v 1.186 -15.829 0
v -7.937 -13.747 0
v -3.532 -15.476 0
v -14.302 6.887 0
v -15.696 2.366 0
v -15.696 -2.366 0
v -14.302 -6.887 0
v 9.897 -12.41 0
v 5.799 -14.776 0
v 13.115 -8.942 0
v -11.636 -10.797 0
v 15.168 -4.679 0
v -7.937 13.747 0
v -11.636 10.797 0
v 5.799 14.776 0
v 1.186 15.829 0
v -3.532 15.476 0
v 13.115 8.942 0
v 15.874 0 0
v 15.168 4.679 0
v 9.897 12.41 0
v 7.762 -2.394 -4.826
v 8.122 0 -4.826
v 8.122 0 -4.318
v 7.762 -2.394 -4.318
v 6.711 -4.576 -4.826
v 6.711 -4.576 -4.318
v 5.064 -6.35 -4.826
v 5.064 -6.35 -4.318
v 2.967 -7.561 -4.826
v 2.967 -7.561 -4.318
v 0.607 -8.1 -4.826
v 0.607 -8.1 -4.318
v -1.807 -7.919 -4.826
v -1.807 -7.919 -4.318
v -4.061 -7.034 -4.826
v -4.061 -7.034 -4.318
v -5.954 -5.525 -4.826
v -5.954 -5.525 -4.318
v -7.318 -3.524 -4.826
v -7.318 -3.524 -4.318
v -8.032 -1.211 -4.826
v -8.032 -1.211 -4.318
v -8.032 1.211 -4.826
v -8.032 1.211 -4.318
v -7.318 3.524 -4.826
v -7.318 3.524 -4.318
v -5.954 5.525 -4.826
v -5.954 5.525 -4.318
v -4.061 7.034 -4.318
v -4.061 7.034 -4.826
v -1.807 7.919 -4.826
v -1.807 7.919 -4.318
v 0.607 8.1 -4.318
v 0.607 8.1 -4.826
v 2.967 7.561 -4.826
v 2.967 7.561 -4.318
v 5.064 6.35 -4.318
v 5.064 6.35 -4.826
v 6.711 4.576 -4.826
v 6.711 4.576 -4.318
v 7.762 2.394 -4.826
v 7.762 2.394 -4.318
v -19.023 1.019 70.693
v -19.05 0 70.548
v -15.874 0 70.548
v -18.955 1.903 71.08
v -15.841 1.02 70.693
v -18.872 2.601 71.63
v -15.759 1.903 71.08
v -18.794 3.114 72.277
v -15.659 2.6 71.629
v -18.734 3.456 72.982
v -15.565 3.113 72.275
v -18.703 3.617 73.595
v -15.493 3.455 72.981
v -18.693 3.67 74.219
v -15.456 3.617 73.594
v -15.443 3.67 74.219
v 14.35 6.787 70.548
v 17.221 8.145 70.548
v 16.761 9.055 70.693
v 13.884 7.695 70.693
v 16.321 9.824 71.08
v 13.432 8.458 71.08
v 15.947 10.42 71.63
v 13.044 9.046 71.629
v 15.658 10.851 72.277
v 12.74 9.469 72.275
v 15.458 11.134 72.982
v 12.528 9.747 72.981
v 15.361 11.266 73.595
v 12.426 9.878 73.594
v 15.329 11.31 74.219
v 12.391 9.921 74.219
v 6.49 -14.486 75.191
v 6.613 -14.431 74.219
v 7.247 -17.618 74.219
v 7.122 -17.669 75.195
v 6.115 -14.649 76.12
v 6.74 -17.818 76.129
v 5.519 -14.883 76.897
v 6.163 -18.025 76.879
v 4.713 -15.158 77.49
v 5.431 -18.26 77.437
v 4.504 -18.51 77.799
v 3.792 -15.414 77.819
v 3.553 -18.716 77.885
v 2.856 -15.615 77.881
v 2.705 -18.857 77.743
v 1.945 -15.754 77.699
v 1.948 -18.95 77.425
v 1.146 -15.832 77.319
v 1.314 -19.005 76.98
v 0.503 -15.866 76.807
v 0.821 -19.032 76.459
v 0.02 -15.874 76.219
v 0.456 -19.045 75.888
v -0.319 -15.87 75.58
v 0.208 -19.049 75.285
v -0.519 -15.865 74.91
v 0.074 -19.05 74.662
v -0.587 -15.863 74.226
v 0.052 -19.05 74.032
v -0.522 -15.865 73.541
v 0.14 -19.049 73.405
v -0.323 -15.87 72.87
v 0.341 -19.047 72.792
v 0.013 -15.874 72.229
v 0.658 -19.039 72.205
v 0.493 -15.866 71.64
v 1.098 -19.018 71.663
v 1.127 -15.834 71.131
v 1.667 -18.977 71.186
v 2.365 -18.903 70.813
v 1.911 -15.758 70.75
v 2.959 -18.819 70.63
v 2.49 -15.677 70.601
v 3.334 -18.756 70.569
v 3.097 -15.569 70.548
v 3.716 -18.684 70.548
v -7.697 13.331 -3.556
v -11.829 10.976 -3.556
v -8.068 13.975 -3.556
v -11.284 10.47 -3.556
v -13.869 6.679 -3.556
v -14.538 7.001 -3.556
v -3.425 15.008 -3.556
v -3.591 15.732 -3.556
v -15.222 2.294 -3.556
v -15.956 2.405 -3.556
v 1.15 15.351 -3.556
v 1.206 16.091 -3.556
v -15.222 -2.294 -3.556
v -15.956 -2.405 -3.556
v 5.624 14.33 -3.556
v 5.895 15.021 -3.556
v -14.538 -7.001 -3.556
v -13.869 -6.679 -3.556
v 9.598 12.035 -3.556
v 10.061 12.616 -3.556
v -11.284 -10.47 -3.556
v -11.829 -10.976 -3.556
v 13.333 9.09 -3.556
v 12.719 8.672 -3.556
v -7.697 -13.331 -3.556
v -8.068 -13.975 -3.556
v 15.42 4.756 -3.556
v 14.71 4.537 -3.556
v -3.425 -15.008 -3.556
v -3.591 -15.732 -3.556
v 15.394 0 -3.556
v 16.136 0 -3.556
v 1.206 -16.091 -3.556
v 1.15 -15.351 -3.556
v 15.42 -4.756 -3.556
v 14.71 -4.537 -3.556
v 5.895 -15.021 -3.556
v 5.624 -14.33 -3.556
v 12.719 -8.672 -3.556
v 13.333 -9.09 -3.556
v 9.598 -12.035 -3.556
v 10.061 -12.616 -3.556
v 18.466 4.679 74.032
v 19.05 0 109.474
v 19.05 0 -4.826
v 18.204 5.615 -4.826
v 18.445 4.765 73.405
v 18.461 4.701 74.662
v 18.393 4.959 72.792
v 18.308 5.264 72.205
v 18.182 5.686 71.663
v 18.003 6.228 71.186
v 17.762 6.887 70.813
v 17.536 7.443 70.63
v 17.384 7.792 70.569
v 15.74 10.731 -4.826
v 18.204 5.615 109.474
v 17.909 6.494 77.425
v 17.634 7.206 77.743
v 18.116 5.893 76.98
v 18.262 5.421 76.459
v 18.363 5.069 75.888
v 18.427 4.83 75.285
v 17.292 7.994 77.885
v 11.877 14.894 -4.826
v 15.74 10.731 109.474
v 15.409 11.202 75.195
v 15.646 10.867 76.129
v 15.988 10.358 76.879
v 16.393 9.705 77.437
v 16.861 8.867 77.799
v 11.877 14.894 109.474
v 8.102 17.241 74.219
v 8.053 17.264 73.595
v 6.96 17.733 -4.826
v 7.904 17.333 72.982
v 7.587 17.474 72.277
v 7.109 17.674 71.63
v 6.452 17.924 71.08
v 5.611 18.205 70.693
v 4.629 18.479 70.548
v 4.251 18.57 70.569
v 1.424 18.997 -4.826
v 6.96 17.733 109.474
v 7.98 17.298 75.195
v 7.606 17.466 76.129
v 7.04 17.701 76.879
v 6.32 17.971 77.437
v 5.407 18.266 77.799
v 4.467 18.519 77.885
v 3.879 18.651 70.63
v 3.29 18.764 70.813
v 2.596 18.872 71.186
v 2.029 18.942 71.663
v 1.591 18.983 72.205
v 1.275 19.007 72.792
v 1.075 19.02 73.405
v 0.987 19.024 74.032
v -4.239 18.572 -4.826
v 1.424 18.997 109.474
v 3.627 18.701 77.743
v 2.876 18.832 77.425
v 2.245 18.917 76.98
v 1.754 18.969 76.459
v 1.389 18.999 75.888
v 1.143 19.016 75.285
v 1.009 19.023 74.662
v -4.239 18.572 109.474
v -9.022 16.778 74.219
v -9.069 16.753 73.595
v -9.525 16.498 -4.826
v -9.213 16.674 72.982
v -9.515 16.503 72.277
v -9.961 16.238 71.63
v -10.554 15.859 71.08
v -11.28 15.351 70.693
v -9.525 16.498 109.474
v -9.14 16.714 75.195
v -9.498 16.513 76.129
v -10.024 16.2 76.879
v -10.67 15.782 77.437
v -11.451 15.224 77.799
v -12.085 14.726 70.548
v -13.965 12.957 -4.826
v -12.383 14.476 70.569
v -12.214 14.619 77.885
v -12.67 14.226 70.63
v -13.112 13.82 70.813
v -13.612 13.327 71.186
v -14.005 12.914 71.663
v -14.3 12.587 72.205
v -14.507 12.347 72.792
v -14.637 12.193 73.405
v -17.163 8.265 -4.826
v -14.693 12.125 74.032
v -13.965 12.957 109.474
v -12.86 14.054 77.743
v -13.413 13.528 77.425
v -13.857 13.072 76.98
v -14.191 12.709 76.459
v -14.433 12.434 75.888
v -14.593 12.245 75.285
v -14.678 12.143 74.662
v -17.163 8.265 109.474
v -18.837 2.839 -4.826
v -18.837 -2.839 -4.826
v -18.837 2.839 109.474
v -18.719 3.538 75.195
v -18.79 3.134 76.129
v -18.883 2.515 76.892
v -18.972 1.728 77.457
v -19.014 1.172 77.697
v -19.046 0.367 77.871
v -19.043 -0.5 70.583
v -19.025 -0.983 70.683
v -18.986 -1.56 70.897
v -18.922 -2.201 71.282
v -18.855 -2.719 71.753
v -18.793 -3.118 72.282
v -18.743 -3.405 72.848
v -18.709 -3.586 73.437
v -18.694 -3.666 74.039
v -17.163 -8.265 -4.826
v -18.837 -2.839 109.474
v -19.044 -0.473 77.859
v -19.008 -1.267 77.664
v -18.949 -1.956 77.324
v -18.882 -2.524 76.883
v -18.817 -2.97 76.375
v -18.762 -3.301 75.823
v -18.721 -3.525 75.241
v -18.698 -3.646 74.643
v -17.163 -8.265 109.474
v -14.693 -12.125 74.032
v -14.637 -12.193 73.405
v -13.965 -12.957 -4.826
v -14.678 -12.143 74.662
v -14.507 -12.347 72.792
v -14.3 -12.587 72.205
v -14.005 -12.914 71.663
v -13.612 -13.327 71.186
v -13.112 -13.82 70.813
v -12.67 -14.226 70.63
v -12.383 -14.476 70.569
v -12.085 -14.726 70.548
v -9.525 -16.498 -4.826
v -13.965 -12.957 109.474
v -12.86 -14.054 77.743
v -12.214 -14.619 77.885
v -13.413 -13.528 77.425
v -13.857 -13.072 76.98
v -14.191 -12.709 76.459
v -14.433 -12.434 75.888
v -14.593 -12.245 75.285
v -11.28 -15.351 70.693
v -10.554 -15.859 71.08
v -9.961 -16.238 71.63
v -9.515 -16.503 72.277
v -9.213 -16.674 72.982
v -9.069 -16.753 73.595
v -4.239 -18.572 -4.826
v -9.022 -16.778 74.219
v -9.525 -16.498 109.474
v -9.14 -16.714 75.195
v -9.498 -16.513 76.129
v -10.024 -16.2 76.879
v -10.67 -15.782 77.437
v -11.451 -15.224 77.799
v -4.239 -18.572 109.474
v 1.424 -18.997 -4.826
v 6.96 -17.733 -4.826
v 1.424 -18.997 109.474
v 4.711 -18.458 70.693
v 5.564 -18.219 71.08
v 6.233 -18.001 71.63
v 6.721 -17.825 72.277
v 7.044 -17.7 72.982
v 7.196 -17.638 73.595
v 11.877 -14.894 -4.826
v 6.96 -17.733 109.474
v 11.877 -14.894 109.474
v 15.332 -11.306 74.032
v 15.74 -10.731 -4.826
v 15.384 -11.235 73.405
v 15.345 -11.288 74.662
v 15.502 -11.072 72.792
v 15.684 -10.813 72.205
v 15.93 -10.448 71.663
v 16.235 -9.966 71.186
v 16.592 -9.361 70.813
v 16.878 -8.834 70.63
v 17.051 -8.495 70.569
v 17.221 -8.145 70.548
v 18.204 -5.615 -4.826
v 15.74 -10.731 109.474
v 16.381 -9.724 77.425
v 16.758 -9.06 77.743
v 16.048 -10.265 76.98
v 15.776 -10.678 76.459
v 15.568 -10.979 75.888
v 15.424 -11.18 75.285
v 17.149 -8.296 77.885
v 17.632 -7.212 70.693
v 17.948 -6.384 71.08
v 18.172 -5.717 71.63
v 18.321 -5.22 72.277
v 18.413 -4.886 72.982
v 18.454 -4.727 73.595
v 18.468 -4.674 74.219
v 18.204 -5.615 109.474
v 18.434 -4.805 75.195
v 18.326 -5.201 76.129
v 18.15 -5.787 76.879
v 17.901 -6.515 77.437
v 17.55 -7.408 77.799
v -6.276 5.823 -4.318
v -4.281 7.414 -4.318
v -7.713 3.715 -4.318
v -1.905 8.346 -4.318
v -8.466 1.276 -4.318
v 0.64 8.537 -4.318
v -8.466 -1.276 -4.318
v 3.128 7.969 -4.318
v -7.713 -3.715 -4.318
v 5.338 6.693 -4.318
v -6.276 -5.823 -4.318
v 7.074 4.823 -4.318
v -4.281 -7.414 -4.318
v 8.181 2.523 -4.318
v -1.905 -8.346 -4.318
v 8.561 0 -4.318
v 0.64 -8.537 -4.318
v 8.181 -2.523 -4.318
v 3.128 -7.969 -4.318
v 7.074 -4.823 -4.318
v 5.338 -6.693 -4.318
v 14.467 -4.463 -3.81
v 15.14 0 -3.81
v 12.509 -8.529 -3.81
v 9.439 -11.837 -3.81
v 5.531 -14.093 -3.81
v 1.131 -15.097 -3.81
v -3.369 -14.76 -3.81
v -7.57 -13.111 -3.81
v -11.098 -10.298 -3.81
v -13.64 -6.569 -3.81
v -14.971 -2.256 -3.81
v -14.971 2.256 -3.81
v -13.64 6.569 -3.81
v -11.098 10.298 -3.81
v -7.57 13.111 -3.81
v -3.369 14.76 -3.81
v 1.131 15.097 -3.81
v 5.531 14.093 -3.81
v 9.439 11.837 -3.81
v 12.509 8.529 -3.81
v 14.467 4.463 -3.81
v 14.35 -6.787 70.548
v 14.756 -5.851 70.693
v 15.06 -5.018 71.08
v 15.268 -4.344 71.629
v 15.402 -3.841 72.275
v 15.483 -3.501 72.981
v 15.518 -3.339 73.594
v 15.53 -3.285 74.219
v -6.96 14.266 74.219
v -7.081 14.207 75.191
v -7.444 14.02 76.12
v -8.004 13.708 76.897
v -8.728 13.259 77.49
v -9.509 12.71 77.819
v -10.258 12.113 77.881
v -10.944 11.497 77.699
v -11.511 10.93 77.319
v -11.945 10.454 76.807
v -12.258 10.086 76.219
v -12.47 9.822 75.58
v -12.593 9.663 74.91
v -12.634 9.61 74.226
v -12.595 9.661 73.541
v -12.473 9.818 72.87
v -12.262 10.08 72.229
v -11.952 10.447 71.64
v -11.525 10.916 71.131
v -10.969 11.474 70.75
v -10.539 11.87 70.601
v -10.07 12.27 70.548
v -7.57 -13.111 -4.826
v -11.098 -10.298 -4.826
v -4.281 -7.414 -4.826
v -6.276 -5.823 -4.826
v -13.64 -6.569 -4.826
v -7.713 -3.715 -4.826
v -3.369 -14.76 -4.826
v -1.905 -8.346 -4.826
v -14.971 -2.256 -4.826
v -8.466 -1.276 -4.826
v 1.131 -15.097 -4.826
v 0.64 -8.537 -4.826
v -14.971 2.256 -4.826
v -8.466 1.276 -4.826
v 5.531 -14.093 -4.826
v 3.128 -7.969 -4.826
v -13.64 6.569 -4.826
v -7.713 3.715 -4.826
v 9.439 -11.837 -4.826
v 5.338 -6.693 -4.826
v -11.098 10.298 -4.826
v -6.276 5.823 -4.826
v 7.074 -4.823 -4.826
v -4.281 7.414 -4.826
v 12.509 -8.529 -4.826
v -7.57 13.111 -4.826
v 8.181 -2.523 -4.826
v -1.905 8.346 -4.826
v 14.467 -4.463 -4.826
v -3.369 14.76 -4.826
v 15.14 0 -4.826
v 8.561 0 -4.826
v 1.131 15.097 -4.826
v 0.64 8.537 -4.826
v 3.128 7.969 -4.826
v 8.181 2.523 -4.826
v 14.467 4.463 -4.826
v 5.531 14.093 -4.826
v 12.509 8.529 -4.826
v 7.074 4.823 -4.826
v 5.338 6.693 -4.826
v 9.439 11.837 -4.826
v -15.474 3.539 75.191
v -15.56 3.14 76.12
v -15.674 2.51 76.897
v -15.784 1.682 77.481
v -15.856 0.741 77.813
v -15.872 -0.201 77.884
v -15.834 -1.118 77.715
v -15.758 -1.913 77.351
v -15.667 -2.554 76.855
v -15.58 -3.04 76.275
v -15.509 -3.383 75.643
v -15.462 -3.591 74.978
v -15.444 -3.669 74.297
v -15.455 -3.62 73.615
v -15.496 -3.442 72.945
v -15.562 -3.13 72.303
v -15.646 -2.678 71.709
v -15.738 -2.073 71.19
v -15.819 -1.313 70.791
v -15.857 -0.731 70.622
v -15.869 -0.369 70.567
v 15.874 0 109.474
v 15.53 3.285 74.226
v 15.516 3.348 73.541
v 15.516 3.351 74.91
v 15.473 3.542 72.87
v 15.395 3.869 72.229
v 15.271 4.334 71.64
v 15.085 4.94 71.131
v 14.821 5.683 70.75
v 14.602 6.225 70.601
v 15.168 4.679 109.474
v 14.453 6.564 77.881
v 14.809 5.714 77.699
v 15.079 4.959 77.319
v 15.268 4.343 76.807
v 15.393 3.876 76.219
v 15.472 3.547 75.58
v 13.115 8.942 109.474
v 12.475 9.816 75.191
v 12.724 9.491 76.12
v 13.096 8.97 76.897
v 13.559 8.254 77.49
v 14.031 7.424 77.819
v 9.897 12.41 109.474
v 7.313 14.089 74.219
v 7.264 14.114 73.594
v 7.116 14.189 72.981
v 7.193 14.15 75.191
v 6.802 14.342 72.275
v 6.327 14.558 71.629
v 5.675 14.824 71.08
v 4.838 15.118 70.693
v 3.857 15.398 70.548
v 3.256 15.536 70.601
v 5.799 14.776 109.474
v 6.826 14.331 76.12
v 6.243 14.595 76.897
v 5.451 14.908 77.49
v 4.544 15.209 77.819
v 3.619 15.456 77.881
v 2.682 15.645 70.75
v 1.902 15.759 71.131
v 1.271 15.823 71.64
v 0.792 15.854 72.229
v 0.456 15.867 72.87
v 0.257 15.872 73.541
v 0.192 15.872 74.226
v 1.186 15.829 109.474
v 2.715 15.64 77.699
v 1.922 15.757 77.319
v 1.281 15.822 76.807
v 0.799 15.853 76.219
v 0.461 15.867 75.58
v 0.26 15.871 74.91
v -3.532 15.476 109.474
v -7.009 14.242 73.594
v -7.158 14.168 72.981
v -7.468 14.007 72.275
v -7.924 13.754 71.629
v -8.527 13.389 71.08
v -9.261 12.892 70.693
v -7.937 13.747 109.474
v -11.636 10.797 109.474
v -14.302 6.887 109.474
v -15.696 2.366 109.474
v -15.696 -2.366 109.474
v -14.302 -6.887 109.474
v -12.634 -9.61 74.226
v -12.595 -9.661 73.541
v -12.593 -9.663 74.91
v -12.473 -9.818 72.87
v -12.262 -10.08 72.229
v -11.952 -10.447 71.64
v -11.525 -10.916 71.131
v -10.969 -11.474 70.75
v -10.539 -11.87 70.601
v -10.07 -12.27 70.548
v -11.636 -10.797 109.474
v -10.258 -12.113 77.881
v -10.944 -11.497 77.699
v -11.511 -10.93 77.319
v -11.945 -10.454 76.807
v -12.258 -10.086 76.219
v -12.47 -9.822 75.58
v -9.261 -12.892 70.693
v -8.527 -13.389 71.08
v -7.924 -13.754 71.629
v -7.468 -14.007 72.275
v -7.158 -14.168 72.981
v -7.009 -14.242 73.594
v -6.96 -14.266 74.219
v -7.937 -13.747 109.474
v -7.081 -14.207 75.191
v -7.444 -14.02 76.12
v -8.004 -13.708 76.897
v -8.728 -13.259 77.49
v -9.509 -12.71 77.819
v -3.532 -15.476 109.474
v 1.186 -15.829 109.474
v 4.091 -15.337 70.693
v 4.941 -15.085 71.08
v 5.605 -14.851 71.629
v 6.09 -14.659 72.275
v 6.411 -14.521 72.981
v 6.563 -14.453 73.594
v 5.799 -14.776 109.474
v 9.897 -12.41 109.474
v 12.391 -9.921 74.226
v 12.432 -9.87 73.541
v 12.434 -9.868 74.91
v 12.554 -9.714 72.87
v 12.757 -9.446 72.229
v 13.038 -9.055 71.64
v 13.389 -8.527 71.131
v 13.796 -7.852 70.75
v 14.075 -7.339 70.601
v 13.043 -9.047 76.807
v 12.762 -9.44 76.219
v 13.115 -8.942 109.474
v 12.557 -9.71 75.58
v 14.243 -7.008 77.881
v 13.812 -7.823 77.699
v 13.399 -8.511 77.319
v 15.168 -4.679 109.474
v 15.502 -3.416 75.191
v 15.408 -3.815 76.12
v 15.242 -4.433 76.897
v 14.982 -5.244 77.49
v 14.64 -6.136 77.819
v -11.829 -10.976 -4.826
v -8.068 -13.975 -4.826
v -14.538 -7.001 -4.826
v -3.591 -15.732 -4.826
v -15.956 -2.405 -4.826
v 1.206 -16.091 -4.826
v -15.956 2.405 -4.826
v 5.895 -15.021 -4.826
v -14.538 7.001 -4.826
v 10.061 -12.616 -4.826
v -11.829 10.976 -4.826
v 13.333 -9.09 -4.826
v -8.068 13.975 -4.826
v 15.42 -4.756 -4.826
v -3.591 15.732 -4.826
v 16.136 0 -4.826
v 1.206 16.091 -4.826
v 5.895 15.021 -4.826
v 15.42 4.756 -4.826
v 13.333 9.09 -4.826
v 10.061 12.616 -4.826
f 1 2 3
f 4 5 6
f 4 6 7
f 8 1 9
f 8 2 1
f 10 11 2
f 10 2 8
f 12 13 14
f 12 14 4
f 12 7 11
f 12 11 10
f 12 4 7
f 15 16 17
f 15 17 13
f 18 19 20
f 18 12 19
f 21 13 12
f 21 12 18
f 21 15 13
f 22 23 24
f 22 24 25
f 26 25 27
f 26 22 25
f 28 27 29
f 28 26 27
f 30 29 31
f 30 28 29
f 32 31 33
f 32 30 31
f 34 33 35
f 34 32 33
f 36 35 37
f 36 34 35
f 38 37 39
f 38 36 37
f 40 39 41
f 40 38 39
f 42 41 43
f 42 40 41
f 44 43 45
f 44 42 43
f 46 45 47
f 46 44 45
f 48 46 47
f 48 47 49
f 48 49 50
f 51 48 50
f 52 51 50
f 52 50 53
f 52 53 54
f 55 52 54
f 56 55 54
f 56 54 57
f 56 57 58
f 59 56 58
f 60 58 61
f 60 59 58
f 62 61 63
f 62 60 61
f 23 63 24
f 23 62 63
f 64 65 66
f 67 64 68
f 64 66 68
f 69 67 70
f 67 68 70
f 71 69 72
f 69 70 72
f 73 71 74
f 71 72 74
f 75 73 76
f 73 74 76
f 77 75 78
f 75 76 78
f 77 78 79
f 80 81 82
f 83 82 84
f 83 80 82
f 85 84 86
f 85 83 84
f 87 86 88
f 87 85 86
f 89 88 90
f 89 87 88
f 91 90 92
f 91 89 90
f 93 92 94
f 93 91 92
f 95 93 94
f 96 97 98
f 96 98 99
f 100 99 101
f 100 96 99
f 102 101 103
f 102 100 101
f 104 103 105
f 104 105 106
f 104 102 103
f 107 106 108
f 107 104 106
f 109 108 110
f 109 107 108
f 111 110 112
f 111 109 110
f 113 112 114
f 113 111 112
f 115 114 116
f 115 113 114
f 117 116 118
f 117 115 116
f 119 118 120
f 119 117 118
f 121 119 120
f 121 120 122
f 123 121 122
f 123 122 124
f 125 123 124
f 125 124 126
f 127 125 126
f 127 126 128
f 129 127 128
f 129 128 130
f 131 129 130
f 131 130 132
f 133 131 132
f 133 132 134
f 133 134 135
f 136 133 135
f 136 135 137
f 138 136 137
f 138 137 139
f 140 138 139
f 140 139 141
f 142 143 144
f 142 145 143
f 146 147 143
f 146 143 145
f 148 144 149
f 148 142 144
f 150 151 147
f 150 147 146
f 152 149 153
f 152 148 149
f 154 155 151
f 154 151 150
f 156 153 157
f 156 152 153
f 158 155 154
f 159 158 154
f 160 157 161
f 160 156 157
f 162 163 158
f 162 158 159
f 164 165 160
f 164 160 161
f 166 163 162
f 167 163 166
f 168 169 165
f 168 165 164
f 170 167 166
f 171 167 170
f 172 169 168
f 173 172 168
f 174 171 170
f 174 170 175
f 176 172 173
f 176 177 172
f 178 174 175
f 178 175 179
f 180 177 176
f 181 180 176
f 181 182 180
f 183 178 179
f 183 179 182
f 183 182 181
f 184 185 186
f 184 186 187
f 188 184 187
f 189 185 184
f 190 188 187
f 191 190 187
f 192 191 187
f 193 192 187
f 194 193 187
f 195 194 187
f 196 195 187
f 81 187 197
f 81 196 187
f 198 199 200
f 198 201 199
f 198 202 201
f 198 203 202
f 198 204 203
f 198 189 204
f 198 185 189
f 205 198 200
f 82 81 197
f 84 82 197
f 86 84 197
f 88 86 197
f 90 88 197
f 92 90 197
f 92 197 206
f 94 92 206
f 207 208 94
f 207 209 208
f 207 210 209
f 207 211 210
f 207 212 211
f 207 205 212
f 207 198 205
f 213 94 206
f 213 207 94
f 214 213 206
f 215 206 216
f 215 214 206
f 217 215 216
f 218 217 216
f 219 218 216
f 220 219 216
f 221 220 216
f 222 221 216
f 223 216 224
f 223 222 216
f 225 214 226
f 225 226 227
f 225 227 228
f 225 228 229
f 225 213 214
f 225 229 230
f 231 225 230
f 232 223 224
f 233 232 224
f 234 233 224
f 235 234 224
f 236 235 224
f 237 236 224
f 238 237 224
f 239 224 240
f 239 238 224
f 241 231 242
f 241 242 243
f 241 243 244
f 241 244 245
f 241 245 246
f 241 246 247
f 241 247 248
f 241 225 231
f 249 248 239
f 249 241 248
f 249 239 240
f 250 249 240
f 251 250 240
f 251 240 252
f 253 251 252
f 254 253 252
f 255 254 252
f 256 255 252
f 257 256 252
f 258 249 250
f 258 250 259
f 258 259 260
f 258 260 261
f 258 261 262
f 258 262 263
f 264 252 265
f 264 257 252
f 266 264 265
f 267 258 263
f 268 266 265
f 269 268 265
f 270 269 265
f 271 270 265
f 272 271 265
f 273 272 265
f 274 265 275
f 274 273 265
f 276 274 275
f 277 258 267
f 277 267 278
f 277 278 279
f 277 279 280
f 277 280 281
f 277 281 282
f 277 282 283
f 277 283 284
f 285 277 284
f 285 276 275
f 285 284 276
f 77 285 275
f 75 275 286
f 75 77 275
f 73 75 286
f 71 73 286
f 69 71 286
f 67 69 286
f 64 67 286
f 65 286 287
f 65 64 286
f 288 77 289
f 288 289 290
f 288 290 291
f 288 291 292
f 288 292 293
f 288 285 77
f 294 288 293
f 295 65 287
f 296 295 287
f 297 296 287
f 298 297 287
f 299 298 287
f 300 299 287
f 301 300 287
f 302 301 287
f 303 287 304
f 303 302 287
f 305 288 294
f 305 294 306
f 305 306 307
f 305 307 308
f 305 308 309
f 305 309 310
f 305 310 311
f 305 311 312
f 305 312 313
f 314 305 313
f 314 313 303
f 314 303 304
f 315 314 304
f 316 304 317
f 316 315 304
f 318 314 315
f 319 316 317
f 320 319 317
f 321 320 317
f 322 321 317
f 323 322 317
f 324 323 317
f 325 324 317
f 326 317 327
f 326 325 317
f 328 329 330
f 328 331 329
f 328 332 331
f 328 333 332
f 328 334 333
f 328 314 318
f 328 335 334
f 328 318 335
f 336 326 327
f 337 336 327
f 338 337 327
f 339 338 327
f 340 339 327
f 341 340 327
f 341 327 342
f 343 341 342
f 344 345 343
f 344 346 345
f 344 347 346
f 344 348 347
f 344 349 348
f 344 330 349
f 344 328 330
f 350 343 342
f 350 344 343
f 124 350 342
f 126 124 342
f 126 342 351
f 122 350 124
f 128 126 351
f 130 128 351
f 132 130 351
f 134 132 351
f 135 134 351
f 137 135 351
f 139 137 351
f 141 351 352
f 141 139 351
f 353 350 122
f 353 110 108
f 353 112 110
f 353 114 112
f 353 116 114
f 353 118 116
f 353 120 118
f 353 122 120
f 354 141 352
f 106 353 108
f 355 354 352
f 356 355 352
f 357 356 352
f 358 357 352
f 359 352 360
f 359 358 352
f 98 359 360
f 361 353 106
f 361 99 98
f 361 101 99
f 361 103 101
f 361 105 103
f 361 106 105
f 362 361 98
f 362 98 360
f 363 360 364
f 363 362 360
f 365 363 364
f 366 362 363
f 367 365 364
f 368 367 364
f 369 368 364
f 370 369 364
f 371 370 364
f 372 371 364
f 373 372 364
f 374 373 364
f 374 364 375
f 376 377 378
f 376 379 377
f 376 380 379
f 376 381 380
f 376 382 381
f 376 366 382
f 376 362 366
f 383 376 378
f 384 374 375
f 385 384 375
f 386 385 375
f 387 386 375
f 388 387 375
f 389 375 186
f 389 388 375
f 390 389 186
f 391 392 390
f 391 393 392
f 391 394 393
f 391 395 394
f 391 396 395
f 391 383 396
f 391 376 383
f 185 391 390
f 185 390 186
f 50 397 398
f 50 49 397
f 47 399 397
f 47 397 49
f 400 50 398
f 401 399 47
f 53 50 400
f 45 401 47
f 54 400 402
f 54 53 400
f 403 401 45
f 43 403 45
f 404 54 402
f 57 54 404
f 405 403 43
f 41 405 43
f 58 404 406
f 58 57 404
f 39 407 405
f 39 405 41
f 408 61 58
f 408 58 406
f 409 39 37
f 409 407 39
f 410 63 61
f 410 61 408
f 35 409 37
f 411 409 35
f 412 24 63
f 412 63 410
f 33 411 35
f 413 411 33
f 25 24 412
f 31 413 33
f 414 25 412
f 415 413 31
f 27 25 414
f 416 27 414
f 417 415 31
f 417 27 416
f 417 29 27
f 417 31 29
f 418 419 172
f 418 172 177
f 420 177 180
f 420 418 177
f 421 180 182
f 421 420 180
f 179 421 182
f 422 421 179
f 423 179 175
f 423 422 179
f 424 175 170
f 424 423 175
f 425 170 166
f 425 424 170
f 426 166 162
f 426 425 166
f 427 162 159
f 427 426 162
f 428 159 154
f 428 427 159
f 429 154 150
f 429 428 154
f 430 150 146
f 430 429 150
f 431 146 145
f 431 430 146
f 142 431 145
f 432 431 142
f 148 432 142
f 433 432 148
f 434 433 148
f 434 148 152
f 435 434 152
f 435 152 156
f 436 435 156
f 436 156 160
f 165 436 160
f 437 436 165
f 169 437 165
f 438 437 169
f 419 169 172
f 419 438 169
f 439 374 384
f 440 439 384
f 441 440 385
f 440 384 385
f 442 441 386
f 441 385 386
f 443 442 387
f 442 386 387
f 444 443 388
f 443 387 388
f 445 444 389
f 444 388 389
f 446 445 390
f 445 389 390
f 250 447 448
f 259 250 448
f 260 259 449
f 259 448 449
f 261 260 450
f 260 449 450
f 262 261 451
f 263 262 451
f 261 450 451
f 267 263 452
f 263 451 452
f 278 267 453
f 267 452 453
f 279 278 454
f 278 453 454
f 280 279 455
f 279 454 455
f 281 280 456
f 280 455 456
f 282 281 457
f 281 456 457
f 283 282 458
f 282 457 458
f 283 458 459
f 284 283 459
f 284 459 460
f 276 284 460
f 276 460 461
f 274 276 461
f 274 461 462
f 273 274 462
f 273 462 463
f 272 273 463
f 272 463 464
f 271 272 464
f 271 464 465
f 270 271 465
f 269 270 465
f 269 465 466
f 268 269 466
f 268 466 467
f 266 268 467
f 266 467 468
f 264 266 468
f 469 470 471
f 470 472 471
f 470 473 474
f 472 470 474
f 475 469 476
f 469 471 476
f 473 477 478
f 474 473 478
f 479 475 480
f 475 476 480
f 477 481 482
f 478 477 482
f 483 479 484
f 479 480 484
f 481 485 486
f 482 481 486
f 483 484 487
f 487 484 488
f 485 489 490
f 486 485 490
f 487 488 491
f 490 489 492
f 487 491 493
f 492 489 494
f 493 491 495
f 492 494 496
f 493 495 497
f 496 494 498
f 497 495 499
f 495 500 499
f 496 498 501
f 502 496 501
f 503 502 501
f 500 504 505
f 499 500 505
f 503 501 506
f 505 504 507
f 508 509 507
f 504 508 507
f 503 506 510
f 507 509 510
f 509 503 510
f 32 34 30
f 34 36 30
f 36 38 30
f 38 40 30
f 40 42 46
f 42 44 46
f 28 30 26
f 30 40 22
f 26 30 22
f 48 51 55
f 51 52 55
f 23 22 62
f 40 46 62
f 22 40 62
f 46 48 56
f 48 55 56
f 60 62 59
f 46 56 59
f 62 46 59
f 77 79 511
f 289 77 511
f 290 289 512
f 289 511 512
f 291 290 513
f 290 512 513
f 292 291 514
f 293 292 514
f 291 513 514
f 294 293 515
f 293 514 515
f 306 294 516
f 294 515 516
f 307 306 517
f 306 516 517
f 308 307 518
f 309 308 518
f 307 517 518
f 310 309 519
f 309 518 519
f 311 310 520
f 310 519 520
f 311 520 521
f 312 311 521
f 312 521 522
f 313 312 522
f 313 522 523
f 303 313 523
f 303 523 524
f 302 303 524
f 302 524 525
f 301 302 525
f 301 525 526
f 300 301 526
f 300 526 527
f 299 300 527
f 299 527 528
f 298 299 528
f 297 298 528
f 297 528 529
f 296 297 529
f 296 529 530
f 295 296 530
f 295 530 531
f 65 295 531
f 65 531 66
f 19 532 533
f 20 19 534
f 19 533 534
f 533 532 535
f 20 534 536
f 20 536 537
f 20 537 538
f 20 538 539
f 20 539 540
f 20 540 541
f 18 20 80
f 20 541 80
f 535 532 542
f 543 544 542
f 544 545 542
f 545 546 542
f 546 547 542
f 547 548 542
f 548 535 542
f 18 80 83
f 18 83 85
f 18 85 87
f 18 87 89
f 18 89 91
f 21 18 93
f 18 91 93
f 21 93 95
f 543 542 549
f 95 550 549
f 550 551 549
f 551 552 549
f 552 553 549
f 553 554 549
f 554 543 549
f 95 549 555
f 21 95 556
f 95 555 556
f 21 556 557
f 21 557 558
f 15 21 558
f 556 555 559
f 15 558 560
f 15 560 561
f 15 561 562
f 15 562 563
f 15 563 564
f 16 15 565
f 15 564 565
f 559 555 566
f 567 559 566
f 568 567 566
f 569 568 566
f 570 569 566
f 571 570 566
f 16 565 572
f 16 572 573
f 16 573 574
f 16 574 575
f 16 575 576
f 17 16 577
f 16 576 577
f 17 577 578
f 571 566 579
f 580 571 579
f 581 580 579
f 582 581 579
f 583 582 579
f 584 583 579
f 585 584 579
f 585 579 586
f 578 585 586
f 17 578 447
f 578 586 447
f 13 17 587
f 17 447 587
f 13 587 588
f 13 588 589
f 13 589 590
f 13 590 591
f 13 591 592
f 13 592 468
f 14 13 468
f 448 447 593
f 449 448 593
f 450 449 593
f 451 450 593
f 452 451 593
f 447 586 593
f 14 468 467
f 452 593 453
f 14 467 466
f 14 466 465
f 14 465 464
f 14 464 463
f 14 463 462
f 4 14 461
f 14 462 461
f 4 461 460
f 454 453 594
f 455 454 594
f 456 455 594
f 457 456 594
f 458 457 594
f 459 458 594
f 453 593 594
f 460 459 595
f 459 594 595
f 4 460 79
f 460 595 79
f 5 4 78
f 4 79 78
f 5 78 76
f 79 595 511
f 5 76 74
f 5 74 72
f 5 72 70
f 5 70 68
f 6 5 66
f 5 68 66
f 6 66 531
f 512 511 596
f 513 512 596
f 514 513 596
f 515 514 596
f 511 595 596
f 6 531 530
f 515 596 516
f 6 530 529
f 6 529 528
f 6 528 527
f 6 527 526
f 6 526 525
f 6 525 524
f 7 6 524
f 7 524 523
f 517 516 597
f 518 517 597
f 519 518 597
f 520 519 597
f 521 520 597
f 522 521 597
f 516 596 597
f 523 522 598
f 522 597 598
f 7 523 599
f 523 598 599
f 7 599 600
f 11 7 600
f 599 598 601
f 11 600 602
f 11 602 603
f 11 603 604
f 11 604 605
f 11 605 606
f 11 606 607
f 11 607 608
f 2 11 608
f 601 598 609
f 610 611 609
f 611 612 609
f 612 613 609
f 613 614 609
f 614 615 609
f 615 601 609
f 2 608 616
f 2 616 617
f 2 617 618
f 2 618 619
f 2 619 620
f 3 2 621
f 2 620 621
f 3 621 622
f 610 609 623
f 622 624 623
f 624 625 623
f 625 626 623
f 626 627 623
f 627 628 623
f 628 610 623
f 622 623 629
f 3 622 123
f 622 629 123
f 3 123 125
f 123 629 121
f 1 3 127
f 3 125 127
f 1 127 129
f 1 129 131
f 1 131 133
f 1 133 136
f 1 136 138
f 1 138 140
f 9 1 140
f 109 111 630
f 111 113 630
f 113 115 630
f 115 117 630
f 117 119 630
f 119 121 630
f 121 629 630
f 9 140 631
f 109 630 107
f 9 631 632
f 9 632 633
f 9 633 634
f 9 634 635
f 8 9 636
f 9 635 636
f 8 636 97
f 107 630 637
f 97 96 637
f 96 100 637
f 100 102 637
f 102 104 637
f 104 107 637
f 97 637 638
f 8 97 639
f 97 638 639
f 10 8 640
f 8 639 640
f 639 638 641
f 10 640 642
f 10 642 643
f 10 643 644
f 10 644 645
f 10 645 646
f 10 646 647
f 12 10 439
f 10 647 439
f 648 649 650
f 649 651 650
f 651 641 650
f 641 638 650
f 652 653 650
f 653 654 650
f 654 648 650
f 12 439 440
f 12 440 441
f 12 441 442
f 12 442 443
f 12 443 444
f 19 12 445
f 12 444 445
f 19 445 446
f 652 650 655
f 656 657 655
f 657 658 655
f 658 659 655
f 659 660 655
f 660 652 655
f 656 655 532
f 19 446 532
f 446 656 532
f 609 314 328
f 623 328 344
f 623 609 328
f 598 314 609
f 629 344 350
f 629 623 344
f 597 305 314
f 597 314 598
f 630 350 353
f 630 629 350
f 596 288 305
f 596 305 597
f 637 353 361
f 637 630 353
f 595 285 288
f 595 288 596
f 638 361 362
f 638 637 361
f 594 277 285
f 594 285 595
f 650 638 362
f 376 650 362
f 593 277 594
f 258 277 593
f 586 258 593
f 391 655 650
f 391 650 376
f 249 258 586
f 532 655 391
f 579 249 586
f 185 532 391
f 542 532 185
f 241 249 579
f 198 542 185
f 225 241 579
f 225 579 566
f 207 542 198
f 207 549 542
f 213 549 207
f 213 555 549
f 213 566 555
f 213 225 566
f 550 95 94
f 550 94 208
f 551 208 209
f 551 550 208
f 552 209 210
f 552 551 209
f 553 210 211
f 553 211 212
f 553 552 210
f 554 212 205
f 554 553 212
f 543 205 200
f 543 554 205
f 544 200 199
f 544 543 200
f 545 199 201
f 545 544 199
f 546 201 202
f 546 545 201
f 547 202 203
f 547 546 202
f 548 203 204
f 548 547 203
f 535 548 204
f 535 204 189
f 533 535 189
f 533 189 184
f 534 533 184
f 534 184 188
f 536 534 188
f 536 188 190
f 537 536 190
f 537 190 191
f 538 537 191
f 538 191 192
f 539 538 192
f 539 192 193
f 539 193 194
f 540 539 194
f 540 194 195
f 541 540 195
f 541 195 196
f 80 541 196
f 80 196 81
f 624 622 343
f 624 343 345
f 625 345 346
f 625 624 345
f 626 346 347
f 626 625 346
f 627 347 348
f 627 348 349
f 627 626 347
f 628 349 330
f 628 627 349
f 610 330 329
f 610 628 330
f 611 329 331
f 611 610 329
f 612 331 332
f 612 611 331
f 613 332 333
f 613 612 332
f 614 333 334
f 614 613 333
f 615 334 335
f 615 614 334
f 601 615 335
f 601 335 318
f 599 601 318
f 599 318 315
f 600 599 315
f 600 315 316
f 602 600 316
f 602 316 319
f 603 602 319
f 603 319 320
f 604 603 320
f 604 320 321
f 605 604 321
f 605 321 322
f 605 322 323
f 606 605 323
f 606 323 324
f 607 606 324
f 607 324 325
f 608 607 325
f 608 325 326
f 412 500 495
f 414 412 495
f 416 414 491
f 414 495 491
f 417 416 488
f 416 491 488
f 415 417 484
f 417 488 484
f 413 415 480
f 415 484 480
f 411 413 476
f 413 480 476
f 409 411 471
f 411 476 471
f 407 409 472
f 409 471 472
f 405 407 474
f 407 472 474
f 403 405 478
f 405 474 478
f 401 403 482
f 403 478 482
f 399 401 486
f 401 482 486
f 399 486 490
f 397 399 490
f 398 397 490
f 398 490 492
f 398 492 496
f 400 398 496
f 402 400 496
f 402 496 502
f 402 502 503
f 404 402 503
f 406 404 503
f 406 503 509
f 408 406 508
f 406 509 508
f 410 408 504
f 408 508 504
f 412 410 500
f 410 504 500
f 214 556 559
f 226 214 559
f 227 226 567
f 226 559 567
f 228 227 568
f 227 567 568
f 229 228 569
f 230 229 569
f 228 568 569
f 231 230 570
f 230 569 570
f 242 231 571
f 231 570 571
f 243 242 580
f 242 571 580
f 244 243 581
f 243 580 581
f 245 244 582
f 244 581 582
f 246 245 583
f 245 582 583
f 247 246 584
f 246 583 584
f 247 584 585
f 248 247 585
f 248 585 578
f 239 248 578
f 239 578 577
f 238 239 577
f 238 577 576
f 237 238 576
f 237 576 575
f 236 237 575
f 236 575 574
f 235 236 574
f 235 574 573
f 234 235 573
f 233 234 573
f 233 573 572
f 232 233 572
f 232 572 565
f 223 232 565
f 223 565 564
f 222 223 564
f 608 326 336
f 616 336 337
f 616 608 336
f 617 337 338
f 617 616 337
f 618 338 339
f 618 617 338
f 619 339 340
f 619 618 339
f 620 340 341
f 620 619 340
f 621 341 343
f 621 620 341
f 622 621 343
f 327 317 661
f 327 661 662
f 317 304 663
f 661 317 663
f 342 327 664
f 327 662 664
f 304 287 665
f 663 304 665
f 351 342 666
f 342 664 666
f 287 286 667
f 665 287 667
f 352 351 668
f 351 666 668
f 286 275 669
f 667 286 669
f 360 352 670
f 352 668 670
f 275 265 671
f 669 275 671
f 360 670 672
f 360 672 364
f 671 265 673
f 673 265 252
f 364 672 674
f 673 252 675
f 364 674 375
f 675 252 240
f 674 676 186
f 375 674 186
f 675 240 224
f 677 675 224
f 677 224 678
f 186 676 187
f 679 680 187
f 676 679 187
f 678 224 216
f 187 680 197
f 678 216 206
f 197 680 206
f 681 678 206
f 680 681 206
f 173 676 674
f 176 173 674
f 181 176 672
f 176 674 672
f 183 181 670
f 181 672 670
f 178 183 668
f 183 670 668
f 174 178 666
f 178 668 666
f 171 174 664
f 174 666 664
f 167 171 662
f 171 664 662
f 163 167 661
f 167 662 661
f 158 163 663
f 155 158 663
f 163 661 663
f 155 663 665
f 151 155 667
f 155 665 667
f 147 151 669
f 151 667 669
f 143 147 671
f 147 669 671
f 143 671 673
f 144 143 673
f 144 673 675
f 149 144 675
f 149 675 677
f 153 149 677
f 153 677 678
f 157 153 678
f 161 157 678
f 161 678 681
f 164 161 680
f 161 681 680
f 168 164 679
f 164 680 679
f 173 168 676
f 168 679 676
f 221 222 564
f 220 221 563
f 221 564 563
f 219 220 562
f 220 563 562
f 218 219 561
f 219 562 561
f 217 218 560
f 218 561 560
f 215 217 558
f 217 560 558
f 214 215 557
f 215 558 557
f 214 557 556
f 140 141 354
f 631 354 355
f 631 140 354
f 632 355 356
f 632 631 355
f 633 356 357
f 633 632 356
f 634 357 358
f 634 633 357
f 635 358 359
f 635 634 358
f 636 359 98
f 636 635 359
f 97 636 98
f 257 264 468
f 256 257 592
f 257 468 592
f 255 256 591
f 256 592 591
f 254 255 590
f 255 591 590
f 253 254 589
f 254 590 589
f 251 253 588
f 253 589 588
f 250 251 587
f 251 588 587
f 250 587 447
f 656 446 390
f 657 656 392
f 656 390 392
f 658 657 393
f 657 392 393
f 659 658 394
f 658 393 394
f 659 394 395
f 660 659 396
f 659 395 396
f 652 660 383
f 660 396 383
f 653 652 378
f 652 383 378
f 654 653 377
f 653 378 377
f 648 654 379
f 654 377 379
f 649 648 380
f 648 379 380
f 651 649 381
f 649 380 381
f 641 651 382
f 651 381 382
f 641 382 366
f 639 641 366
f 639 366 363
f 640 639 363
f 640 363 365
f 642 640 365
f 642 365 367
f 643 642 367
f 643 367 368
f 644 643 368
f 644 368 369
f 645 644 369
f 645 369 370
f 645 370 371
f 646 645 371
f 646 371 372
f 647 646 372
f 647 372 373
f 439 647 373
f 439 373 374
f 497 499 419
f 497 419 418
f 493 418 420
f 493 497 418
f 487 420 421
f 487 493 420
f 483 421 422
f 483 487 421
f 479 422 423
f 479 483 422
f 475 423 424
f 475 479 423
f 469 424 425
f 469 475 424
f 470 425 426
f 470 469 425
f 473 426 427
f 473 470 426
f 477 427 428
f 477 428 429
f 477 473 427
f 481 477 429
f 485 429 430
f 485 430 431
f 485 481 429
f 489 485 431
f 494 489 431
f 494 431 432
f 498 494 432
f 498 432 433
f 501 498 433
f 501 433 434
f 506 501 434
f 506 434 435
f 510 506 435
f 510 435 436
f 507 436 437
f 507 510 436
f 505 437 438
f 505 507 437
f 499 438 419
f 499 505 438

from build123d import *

# Parameters (mm, degrees)
F0_R      = 19.05
F1_DEPTH  = 109.474
F2_R      = 15.873592274
F3_DEPTH  = 109.728
F4_R      = 19.05
F5_DEPTH  = 1.27
F25_DEPTH = 25.4
F26_DEPTH = 32.004
F28_DEPTH = 45.466
F30_DEPTH = 34.036
F32_DEPTH = 25.4
F34_DEPTH = 25.4
F36_DEPTH = 53.086
F38_DEPTH = 65.786
F39_R     = 19.05
F40_DEPTH = 4.826
F41_R     = 16.1364398947
F41_R_2   = 15.139722271
F42_DEPTH = 1.27
F43_SIZE  = 0.254
F44_R     = 8.561127958
F44_R_2   = 8.1224197416
F45_DEPTH = 0.508


with BuildPart() as f1:
    # F0 (on Top) → F1 (new body)
    with BuildSketch(Plane.XY):
        Circle(F0_R)
    extrude(amount=F1_DEPTH)

    # F2 (on face) → F3 (cut)
    with BuildSketch(Plane.XY.offset(109.474)):
        Circle(F2_R)
    extrude(amount=-F3_DEPTH, mode=Mode.SUBTRACT)

    # F4 (on Top) → F5 (join)
    with BuildSketch(Plane.XY):
        Circle(F4_R)
    extrude(amount=-F5_DEPTH)

    # F24 (on face) → F25 (join)
    with BuildSketch(Plane(origin=(0, 0, 0), x_dir=(0.4275550934, 0.9039892931, 0), z_dir=(0.9039892931, -0.4275550934, 0))):
        with BuildLine():
            ThreePointArc((0, 70.5485), (2.595294019, 71.623505981), (3.6703, 74.2188))
            ThreePointArc((3.6703, 74.2188), (-2.595294019, 76.814094019), (0, 70.5485))
        make_face()
    extrude(amount=F25_DEPTH)

    # F26 (cut): a face of the model
    f26_faces = [f1.faces().sort_by_distance(p)[0] for p in [
        (22.9613280453, -10.8598993731, 74.2188),
    ]]
    extrude(f26_faces, amount=-F26_DEPTH, mode=Mode.SUBTRACT)

    # F27 (on face) → F28 (cut)
    with BuildSketch(Plane(origin=(0, 0, 0), x_dir=(-0.4275550934, 0.9039892931, 0), z_dir=(0.9039892931, 0.4275550934, 0))):
        with BuildLine():
            ThreePointArc((0, 70.5485), (2.595294019, 71.623505981), (3.6703, 74.2188))
            ThreePointArc((3.6703, 74.2188), (-2.595294019, 76.814094019), (0, 70.5485))
        make_face()
    extrude(amount=F28_DEPTH, mode=Mode.SUBTRACT)

    # F29 (on face) → F30 (cut)
    with BuildSketch(Plane(origin=(0, 0, 0), x_dir=(0.9700312532, -0.2429801799, 0), z_dir=(-0.2429801799, -0.9700312532, 0))):
        with BuildLine():
            ThreePointArc((0, 70.5485), (2.595294019, 71.623505981), (3.6703, 74.2188))
            ThreePointArc((3.6703, 74.2188), (-2.595294019, 76.814094019), (0, 70.5485))
        make_face()
    extrude(amount=-F30_DEPTH, mode=Mode.SUBTRACT)

    # F31 (on face) → F32 (cut)
    with BuildSketch(Plane(origin=(0, 0, 0), x_dir=(0.7730104534, 0.6343932842, 0), z_dir=(0.6343932842, -0.7730104534, 0))):
        with BuildLine():
            ThreePointArc((0, 70.5485), (2.595294019, 71.623505981), (3.6703, 74.2188))
            ThreePointArc((3.6703, 74.2188), (-2.595294019, 76.814094019), (0, 70.5485))
        make_face()
    extrude(amount=-F32_DEPTH, mode=Mode.SUBTRACT)

    # F33 (on Right) → F34 (cut)
    with BuildSketch(Plane.YZ):
        with BuildLine():
            ThreePointArc((0, 70.5485), (2.595294019, 71.623505981), (3.6703, 74.2188))
            ThreePointArc((3.6703, 74.2188), (-2.595294019, 76.814094019), (0, 70.5485))
        make_face()
    extrude(amount=-F34_DEPTH, mode=Mode.SUBTRACT)

    # F35 (on face) → F36 (cut)
    with BuildSketch(Plane(origin=(0, 0, 0), x_dir=(0.7730104534, -0.6343932842, 0), z_dir=(-0.6343932842, -0.7730104534, 0))):
        with BuildLine():
            ThreePointArc((0, 70.5485), (2.595294019, 71.623505981), (3.6703, 74.2188))
            ThreePointArc((3.6703, 74.2188), (-2.595294019, 76.814094019), (0, 70.5485))
        make_face()
    extrude(amount=F36_DEPTH, mode=Mode.SUBTRACT)

    # F37 (on face) → F38 (cut)
    with BuildSketch(Plane(origin=(0, 0, 0), x_dir=(0.9807852804, 0.195090322, 0), z_dir=(0.195090322, -0.9807852804, 0))):
        with BuildLine():
            ThreePointArc((0, 70.5485), (2.595294019, 71.623505981), (3.6703, 74.2188))
            ThreePointArc((3.6703, 74.2188), (-2.595294019, 76.814094019), (0, 70.5485))
        make_face()
    extrude(amount=F38_DEPTH, mode=Mode.SUBTRACT)

    # F39 (on Top) → F40 (join)
    with BuildSketch(Plane.XY):
        Circle(F39_R)
    extrude(amount=-F40_DEPTH)

    # F41 (on face) → F42 (cut)
    with BuildSketch(Plane(origin=(0, 0, -4.826), x_dir=(1, 0, 0), z_dir=(0, 0, -1))):
        Circle(F41_R)
        Circle(F41_R_2, mode=Mode.SUBTRACT)
    extrude(amount=-F42_DEPTH, mode=Mode.SUBTRACT)

    # F43
    f43_edges = [f1.edges().sort_by_distance(p)[0] for p in [
        (-15.139722, 0, -3.556),
    ]]
    chamfer(f43_edges, length=F43_SIZE)

    # F44 (on face) → F45 (cut)
    with BuildSketch(Plane(origin=(0, 0, -4.826), x_dir=(1, 0, 0), z_dir=(0, 0, -1))):
        Circle(F44_R)
        Circle(F44_R_2, mode=Mode.SUBTRACT)
    extrude(amount=-F45_DEPTH, mode=Mode.SUBTRACT)


solid = f1.part
